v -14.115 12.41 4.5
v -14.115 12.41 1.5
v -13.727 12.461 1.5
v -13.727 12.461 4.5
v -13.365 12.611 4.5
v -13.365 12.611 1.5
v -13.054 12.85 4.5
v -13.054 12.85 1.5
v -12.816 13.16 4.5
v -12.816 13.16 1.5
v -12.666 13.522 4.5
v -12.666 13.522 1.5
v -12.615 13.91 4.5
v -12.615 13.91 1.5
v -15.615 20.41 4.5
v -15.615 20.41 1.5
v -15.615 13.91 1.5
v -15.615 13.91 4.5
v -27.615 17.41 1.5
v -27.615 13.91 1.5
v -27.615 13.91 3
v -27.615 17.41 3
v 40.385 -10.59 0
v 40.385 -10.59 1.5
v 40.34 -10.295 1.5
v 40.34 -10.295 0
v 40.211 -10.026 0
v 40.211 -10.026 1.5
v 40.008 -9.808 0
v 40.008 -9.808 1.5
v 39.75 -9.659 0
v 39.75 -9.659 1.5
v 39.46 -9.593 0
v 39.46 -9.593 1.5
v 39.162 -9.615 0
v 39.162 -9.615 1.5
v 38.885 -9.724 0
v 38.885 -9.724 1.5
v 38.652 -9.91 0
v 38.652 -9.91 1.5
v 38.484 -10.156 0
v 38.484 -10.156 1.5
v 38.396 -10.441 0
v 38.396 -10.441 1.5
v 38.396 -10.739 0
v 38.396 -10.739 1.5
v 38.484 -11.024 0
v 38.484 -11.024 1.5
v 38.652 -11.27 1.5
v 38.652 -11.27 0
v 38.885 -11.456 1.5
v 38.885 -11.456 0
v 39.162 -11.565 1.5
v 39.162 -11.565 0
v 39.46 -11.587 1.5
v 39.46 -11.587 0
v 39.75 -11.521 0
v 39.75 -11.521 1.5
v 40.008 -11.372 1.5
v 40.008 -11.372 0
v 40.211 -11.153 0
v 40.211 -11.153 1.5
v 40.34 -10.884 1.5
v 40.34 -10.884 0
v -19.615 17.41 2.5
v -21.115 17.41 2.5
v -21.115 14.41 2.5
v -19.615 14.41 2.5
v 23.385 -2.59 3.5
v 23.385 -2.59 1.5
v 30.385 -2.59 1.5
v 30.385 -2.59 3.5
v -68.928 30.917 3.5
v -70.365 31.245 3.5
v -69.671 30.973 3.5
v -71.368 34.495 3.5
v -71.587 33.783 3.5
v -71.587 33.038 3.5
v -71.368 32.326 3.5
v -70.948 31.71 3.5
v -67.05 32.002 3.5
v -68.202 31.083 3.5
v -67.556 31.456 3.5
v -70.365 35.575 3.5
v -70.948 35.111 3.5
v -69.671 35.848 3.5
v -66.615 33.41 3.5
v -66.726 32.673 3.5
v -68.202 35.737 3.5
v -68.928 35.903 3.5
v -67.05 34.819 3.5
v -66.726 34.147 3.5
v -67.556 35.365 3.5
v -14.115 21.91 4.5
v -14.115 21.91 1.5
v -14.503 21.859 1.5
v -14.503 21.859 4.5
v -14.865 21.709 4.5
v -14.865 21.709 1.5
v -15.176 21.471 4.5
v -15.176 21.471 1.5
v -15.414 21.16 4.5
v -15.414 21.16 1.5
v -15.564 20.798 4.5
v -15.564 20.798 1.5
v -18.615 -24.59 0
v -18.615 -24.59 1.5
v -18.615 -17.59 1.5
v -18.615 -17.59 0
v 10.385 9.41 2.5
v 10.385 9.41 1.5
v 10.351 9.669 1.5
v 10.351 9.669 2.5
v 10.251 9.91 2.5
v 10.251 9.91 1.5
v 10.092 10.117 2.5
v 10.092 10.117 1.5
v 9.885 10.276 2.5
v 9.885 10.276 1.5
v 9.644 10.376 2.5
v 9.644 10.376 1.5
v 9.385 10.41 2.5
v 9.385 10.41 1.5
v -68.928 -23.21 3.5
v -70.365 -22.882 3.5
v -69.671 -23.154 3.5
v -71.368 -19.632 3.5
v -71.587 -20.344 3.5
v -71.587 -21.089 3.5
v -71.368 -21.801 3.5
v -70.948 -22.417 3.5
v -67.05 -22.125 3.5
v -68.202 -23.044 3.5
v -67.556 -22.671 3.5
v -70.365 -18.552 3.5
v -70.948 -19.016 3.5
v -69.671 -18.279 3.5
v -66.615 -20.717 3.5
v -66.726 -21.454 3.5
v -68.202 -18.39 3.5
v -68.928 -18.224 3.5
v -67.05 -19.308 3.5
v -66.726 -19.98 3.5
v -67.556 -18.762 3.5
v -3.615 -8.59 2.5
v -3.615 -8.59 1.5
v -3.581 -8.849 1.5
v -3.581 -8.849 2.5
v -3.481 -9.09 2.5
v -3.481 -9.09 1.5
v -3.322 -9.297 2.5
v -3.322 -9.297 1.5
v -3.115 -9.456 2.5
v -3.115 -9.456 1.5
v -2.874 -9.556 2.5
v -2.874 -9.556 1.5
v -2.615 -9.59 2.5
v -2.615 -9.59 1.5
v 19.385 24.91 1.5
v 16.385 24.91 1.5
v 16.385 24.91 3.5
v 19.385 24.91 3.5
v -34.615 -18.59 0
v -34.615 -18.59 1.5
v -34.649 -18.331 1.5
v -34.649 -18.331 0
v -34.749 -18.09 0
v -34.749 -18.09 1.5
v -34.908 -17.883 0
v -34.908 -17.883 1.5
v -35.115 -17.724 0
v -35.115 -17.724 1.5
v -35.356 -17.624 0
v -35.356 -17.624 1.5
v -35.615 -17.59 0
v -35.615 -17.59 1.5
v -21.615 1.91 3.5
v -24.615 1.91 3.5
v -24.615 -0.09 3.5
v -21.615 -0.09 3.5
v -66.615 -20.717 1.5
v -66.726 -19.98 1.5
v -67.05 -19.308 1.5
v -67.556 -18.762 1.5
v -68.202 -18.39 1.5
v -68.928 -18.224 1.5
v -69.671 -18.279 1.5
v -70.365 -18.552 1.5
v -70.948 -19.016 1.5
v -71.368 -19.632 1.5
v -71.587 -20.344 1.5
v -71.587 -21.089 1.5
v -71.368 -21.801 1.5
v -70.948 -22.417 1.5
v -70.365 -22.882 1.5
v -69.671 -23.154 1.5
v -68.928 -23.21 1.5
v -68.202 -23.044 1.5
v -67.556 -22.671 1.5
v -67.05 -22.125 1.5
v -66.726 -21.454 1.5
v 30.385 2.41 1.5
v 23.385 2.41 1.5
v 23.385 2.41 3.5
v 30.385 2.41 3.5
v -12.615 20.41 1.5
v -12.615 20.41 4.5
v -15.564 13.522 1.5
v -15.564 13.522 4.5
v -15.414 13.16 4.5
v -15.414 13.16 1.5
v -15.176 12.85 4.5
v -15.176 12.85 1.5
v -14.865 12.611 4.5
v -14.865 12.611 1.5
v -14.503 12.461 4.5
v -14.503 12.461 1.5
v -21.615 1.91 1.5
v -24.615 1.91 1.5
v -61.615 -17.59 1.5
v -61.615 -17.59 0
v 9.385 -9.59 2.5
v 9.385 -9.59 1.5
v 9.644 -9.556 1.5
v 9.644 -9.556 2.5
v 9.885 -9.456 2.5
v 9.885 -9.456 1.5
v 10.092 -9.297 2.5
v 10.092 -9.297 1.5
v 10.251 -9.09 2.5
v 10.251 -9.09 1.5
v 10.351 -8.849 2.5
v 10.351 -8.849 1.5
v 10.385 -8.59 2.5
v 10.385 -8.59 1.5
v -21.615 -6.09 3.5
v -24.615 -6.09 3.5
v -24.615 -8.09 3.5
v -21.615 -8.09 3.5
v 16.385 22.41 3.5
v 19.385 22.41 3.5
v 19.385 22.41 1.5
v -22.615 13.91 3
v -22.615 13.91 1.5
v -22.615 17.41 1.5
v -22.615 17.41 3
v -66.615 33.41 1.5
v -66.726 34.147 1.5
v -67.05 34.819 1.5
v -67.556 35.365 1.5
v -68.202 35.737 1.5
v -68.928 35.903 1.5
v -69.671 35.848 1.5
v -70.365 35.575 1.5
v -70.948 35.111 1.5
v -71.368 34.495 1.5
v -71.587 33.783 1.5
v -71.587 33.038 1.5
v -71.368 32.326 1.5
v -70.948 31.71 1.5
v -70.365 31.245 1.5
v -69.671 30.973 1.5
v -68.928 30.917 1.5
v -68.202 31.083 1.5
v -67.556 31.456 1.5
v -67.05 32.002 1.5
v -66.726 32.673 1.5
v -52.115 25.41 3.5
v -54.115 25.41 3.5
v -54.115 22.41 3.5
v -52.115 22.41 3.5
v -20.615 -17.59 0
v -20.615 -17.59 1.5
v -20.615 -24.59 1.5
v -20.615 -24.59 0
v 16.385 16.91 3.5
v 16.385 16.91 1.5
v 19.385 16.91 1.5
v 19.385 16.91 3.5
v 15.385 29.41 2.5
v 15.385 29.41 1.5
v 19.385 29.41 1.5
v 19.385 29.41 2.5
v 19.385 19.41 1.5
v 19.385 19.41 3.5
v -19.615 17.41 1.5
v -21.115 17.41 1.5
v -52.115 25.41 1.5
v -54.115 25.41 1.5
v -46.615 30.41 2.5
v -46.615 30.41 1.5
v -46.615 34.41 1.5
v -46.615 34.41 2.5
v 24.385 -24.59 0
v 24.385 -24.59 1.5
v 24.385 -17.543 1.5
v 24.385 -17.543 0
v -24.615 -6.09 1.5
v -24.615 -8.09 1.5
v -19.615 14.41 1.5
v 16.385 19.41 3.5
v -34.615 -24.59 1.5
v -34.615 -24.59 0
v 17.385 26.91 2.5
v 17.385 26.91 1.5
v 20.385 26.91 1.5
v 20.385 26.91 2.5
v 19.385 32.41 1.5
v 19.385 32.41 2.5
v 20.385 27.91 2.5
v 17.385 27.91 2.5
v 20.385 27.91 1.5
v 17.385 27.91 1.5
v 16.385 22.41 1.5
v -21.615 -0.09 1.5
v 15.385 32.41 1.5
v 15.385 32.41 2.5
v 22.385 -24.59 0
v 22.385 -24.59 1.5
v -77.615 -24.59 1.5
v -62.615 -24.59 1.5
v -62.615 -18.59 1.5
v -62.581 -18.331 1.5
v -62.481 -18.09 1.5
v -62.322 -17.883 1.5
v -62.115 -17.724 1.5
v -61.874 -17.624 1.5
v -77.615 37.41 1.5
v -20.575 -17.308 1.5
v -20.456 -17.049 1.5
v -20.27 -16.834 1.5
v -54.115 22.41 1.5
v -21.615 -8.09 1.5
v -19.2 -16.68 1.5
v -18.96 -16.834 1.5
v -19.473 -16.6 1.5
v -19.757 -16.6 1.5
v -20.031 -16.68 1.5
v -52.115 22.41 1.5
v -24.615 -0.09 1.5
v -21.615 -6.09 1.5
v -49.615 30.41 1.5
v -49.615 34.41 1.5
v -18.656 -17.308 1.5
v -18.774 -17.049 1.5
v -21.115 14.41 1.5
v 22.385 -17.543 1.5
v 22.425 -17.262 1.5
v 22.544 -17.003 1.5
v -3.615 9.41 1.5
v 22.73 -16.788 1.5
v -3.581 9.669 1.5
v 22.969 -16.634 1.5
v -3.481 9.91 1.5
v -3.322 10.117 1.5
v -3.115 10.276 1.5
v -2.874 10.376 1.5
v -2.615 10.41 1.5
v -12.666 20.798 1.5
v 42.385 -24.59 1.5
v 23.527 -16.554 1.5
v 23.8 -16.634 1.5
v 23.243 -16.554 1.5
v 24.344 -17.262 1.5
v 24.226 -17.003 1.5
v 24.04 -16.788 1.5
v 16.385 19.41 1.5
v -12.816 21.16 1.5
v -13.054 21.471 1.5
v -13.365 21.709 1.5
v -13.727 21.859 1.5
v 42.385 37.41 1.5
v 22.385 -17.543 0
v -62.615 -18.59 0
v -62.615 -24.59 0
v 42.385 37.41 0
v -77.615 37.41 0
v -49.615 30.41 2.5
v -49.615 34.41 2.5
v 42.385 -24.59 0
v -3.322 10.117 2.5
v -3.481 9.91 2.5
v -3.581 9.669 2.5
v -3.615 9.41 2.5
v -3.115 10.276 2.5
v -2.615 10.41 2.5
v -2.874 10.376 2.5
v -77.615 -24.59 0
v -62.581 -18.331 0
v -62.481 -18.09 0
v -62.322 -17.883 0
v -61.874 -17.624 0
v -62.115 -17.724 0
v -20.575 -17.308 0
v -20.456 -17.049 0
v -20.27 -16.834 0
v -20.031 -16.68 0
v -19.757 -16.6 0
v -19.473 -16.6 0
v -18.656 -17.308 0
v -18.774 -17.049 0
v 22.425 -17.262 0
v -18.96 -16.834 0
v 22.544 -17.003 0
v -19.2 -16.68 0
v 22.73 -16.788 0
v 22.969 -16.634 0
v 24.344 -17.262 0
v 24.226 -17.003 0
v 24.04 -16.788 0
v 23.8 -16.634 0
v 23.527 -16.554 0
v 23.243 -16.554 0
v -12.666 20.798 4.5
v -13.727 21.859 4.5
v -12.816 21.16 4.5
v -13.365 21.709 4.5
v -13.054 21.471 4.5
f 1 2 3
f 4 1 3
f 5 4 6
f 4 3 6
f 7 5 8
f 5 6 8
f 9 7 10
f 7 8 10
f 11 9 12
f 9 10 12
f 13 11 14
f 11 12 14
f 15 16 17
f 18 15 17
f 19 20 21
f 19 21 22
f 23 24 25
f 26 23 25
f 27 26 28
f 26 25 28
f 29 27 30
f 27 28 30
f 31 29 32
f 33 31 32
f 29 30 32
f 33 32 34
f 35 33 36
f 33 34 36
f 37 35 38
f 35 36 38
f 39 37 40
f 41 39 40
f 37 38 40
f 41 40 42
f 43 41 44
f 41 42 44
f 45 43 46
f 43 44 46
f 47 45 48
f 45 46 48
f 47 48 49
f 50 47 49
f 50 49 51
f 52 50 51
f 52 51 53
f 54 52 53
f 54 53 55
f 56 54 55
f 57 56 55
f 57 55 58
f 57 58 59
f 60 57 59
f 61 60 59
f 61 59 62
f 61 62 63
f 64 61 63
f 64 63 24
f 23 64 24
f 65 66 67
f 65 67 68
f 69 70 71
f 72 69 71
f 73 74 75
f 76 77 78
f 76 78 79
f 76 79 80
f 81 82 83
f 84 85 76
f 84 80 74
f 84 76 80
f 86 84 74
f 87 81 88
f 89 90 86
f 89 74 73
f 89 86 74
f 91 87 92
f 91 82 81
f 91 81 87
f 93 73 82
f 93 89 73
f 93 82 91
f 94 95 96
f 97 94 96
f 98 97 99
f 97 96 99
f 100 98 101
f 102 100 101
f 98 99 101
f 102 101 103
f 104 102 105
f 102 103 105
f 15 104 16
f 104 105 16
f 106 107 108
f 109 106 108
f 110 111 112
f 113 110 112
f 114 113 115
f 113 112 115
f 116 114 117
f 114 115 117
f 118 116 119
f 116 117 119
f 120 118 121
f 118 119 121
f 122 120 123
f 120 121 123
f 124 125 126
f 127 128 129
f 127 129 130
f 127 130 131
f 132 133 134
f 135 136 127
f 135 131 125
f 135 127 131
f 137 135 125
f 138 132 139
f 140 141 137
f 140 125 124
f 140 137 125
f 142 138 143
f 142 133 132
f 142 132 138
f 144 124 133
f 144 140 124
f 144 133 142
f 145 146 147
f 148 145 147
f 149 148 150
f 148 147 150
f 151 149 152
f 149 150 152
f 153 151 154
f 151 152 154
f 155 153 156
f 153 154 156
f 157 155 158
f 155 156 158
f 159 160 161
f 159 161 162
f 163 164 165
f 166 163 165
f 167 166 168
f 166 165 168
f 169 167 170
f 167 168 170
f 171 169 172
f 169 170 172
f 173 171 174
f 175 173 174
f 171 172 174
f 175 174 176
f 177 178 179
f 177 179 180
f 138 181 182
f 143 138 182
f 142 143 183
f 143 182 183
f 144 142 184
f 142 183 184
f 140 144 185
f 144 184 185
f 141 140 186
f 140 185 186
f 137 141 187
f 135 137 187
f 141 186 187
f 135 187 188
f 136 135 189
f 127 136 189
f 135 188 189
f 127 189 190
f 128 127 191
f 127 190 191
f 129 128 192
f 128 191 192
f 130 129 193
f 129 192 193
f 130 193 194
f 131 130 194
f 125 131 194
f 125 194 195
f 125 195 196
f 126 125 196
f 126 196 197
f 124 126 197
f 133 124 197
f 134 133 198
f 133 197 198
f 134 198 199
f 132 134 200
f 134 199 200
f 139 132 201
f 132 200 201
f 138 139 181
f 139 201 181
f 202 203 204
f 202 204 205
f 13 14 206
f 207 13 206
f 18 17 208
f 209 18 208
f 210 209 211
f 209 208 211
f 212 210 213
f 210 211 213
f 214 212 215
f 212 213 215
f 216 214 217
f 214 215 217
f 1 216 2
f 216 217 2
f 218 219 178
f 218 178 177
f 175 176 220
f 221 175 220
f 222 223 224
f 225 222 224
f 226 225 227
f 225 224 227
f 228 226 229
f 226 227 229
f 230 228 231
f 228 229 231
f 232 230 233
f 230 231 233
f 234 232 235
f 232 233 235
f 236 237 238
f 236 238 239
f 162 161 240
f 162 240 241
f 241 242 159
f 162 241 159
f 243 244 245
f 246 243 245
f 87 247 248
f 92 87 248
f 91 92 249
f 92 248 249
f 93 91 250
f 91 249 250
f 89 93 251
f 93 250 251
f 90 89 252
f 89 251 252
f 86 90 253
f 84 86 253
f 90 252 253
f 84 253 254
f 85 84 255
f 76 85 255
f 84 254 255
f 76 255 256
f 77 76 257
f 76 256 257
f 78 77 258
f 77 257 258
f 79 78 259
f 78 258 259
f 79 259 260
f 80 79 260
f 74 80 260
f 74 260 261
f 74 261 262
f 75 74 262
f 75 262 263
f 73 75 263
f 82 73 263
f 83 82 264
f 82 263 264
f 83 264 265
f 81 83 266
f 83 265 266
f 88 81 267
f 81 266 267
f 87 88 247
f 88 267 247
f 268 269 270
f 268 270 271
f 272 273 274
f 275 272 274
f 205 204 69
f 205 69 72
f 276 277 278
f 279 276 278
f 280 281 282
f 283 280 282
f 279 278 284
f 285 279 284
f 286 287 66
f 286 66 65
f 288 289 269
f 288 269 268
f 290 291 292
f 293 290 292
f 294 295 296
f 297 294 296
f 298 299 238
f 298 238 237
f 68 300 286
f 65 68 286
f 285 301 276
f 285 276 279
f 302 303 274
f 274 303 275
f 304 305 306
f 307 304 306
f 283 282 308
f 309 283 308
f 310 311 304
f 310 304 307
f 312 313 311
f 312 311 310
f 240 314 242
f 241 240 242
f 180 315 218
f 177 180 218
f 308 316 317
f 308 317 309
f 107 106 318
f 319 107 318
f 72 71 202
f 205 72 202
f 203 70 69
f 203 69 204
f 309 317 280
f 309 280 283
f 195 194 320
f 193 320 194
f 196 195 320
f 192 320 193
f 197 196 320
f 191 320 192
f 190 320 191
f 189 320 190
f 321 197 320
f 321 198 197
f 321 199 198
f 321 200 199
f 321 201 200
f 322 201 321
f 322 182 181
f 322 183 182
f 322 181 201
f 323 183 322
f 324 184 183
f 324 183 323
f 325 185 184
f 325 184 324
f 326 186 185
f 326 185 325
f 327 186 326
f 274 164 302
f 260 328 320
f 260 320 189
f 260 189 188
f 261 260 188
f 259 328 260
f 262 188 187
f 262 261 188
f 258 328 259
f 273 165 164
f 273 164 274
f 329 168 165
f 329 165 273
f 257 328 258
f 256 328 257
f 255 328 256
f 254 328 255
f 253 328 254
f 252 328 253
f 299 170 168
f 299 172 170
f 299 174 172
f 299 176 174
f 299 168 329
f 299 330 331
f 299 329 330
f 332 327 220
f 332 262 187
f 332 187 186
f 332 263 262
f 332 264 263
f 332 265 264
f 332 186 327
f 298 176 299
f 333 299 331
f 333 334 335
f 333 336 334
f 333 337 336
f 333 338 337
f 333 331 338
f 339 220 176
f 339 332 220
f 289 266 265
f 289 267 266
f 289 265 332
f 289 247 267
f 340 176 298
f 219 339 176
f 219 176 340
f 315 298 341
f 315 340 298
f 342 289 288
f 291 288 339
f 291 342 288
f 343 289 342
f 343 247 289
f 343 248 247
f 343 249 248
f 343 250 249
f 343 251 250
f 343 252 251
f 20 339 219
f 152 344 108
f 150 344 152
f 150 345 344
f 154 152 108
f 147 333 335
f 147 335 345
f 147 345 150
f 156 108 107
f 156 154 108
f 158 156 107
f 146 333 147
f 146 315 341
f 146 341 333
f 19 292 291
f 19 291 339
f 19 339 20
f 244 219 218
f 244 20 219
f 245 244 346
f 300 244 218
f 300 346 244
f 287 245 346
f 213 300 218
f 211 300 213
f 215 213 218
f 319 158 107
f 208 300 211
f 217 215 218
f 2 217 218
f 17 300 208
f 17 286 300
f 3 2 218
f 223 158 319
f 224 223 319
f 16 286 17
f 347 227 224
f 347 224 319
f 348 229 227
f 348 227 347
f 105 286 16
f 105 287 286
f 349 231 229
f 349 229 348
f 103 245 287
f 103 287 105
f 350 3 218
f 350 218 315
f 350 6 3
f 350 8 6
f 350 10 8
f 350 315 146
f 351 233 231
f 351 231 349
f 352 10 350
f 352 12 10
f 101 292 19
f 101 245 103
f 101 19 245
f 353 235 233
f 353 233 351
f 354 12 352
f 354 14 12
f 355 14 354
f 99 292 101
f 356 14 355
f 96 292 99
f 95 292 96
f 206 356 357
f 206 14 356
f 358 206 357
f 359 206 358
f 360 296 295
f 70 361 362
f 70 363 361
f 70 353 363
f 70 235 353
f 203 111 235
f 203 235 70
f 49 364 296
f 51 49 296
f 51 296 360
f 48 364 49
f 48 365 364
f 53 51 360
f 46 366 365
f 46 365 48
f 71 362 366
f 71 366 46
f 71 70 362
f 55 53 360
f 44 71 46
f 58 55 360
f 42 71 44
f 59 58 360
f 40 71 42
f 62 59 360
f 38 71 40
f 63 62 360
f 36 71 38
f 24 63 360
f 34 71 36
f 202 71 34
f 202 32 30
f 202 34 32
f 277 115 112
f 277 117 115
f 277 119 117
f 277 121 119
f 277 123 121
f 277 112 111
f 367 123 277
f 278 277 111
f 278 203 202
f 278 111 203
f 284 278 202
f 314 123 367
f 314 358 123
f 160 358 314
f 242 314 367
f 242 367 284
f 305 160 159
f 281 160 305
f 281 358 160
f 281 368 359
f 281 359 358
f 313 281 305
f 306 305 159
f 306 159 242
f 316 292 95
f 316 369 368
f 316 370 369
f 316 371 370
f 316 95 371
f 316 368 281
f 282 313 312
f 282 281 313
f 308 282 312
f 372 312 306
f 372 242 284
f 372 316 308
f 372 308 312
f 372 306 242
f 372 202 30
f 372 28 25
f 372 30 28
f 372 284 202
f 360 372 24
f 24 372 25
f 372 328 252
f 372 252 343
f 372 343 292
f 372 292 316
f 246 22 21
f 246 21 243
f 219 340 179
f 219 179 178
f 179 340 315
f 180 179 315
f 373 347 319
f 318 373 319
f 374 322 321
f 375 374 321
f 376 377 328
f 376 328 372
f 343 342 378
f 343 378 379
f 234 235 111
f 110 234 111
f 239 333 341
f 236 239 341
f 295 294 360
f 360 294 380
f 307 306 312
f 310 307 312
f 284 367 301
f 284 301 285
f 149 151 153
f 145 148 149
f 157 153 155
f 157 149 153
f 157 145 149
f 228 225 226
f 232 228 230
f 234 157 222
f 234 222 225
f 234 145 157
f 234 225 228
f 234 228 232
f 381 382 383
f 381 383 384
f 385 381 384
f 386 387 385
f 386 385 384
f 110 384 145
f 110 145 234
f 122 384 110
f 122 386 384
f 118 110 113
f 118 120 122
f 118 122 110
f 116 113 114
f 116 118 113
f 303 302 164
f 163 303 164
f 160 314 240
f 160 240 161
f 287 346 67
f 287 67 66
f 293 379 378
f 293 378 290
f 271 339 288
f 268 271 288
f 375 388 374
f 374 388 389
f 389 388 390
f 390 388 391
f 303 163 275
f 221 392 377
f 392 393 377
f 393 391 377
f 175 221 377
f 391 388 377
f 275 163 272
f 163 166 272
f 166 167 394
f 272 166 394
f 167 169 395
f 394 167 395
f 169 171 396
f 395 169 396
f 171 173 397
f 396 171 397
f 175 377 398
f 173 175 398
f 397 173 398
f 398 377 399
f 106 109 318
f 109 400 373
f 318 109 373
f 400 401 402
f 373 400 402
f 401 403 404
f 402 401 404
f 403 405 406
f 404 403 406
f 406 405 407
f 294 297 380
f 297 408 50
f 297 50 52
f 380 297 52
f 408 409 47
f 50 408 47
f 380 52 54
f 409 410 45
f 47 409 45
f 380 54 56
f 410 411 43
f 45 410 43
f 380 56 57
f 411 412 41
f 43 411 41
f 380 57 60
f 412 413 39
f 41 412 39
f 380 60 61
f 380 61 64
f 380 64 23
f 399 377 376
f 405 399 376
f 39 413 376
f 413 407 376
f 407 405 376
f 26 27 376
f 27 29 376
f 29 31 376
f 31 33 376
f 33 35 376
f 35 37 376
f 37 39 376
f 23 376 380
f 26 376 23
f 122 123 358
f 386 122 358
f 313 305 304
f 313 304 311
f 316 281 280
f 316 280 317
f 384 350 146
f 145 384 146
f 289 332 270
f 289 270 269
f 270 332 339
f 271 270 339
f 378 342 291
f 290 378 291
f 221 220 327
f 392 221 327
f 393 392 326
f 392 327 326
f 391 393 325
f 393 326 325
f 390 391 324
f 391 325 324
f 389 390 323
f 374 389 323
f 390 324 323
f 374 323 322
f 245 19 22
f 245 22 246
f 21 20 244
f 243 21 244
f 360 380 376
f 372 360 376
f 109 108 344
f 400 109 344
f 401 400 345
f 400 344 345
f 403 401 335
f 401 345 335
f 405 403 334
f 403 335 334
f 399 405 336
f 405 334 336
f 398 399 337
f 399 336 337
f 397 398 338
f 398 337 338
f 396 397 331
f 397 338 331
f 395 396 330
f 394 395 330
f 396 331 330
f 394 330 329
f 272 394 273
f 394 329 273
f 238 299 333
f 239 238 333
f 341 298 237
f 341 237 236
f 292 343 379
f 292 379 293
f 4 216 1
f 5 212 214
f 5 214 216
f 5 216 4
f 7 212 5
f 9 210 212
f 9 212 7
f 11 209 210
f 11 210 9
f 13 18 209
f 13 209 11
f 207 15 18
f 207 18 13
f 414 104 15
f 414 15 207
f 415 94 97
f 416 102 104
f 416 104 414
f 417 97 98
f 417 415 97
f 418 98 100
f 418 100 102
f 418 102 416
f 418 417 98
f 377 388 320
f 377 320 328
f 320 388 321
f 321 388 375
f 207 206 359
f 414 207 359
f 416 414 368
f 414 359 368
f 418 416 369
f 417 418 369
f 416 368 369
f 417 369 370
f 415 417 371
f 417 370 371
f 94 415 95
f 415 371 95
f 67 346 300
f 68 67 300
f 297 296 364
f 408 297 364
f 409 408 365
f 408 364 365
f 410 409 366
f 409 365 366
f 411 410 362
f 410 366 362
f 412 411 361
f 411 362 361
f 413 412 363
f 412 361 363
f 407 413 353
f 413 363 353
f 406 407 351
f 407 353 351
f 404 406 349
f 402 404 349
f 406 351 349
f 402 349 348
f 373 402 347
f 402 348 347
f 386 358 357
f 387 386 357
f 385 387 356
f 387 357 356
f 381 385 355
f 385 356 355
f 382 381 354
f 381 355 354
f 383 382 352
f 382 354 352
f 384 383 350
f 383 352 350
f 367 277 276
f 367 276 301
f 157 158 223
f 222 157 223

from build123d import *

# Parameters (mm, degrees)
F0_W      = 120
F0_H      = 62
F1_DEPTH  = 1.5
F3_DEPTH  = 1.501
F5_DEPTH  = 1.501
F7_DEPTH  = 1.501
F8_R      = 1
F9_DEPTH  = 1.501
F10_W     = 7
F10_H     = 5
F11_DEPTH = 2
F13_DEPTH = 1
F14_W     = 3
F14_H     = 2.5
F15_DEPTH = 2
F16_W     = 3
F16_H     = 2.5
F17_DEPTH = 2
F18_W     = 3
F18_H     = 1
F19_DEPTH = 1
F20_W     = 4
F20_H     = 3
F21_DEPTH = 1
F23_DEPTH = 3
F24_W     = 1.5
F24_H     = 3
F25_DEPTH = 1
F26_W     = 5
F26_H     = 3.5
F27_DEPTH = 1.5
F28_W     = 3
F28_H     = 2
F29_DEPTH = 2
F30_W     = 3
F30_H     = 2
F31_DEPTH = 2
F32_R     = 2.5
F33_DEPTH = 2
F34_R     = 2.5
F35_DEPTH = 2
F36_W     = 3
F36_H     = 4
F37_DEPTH = 1
F38_W     = 2
F38_H     = 3
F39_DEPTH = 2


with BuildPart() as f1:
    # F0 (on Top) → F1 (new body)
    with BuildSketch(Plane.XY):
        with Locations((-17.615131, 6.410271)):
            Rectangle(F0_W, F0_H)
    extrude(amount=F1_DEPTH)

    # F2 (on face) → F3 (cut, through all)
    with BuildSketch(Plane.XY.offset(1.5)):
        with BuildLine():
            Line((-62.615131, -18.589729), (-62.615131, -24.589729))
            Line((-62.615131, -24.589729), (-34.615131, -24.589729))
            Line((-34.615131, -24.589729), (-34.615131, -18.589729))
            ThreePointArc((-34.615131, -18.589729), (-34.908024, -17.882622), (-35.615131, -17.589729))
            Line((-35.615131, -17.589729), (-61.615131, -17.589729))
            ThreePointArc((-61.615131, -17.589729), (-62.322238, -17.882622), (-62.615131, -18.589729))
        make_face()
    extrude(amount=-F3_DEPTH, mode=Mode.SUBTRACT)

    # F4 (on face) → F5 (cut, through all)
    with BuildSketch(Plane.XY.offset(1.5)):
        with BuildLine():
            Line((-20.615131, -17.589729), (-20.615131, -24.589729))
            Line((-20.615131, -24.589729), (-18.615131, -24.589729))
            Line((-18.615131, -24.589729), (-18.615131, -17.589729))
            ThreePointArc((-18.615131, -17.589729), (-19.615131, -16.589729), (-20.615131, -17.589729))
        make_face()
    extrude(amount=-F5_DEPTH, mode=Mode.SUBTRACT)

    # F6 (on face) → F7 (cut, through all)
    with BuildSketch(Plane.XY.offset(1.5)):
        with BuildLine():
            Line((22.384869, -17.543457), (22.384869, -24.589729))
            Line((22.384869, -24.589729), (24.384869, -24.589729))
            Line((24.384869, -24.589729), (24.384869, -17.543457))
            ThreePointArc((24.384869, -17.543457), (23.384869, -16.543457), (22.384869, -17.543457))
        make_face()
    extrude(amount=-F7_DEPTH, mode=Mode.SUBTRACT)

    # F8 (on face) → F9 (cut, through all)
    with BuildSketch(Plane.XY.offset(1.5)):
        with Locations((39.384869, -10.589729)):
            Circle(F8_R)
    extrude(amount=-F9_DEPTH, mode=Mode.SUBTRACT)

    # F10 (on face) → F11 (join)
    with BuildSketch(Plane.XY.offset(1.5)):
        with Locations((26.884869, -0.089729)):
            Rectangle(F10_W, F10_H)
    extrude(amount=F11_DEPTH)

    # F12 (on face) → F13 (join)
    with BuildSketch(Plane.XY.offset(1.5)):
        with BuildLine():
            Line((9.384869, 10.410271), (-2.615131, 10.410271))
            ThreePointArc((-2.615131, 10.410271), (-3.322238, 10.117378), (-3.615131, 9.410271))
            Line((-3.615131, 9.410271), (-3.615131, -8.589729))
            ThreePointArc((-3.615131, -8.589729), (-3.322238, -9.296836), (-2.615131, -9.589729))
            Line((-2.615131, -9.589729), (9.384869, -9.589729))
            ThreePointArc((9.384869, -9.589729), (10.091976, -9.296836), (10.384869, -8.589729))
            Line((10.384869, -8.589729), (10.384869, 9.410271))
            ThreePointArc((10.384869, 9.410271), (10.091976, 10.117378), (9.384869, 10.410271))
        make_face()
    extrude(amount=F13_DEPTH)

    # F14 (on face) → F15 (join)
    with BuildSketch(Plane.XY.offset(1.5)):
        with Locations((17.884869, 18.160271)):
            Rectangle(F14_W, F14_H)
    extrude(amount=F15_DEPTH)

    # F16 (on face) → F17 (join)
    with BuildSketch(Plane.XY.offset(1.5)):
        with Locations((17.884869, 23.660271)):
            Rectangle(F16_W, F16_H)
    extrude(amount=F17_DEPTH)

    # F18 (on face) → F19 (join)
    with BuildSketch(Plane.XY.offset(1.5)):
        with Locations((18.884869, 27.410271)):
            Rectangle(F18_W, F18_H)
    extrude(amount=F19_DEPTH)

    # F20 (on face) → F21 (join)
    with BuildSketch(Plane.XY.offset(1.5)):
        with Locations((17.384869, 30.910271)):
            Rectangle(F20_W, F20_H)
    extrude(amount=F21_DEPTH)

    # F22 (on face) → F23 (join)
    with BuildSketch(Plane.XY.offset(1.5)):
        with BuildLine():
            ThreePointArc((-14.115131, 21.910271), (-15.175791, 21.470931), (-15.615131, 20.410271))
            Line((-15.615131, 20.410271), (-15.615131, 13.910271))
            ThreePointArc((-15.615131, 13.910271), (-15.175791, 12.849611), (-14.115131, 12.410271))
            ThreePointArc((-14.115131, 12.410271), (-13.054471, 12.849611), (-12.615131, 13.910271))
            Line((-12.615131, 13.910271), (-12.615131, 20.410271))
            ThreePointArc((-12.615131, 20.410271), (-13.054471, 21.470931), (-14.115131, 21.910271))
        make_face()
    extrude(amount=F23_DEPTH)

    # F24 (on face) → F25 (join)
    with BuildSketch(Plane.XY.offset(1.5)):
        with Locations((-20.365131, 15.910271)):
            Rectangle(F24_W, F24_H)
    extrude(amount=F25_DEPTH)

    # F26 (on face) → F27 (join)
    with BuildSketch(Plane.XY.offset(1.5)):
        with Locations((-25.115131, 15.660271)):
            Rectangle(F26_W, F26_H)
    extrude(amount=F27_DEPTH)

    # F28 (on face) → F29 (join)
    with BuildSketch(Plane.XY.offset(1.5)):
        with Locations((-23.115131, 0.910271)):
            Rectangle(F28_W, F28_H)
    extrude(amount=F29_DEPTH)

    # F30 (on face) → F31 (join)
    with BuildSketch(Plane.XY.offset(1.5)):
        with Locations((-23.115131, -7.089729)):
            Rectangle(F30_W, F30_H)
    extrude(amount=F31_DEPTH)

    # F32 (on face) → F33 (join)
    with BuildSketch(Plane.XY.offset(1.5)):
        with Locations((-69.115131, 33.410271)):
            Circle(F32_R)
    extrude(amount=F33_DEPTH)

    # F34 (on face) → F35 (join)
    with BuildSketch(Plane.XY.offset(1.5)):
        with Locations((-69.115131, -20.716745)):
            Circle(F34_R)
    extrude(amount=F35_DEPTH)

    # F36 (on face) → F37 (join)
    with BuildSketch(Plane.XY.offset(1.5)):
        with Locations((-48.115131, 32.410271)):
            Rectangle(F36_W, F36_H)
    extrude(amount=F37_DEPTH)

    # F38 (on face) → F39 (join)
    with BuildSketch(Plane.XY.offset(1.5)):
        with Locations((-53.115131, 23.910271)):
            Rectangle(F38_W, F38_H)
    extrude(amount=F39_DEPTH)


solid = f1.part
